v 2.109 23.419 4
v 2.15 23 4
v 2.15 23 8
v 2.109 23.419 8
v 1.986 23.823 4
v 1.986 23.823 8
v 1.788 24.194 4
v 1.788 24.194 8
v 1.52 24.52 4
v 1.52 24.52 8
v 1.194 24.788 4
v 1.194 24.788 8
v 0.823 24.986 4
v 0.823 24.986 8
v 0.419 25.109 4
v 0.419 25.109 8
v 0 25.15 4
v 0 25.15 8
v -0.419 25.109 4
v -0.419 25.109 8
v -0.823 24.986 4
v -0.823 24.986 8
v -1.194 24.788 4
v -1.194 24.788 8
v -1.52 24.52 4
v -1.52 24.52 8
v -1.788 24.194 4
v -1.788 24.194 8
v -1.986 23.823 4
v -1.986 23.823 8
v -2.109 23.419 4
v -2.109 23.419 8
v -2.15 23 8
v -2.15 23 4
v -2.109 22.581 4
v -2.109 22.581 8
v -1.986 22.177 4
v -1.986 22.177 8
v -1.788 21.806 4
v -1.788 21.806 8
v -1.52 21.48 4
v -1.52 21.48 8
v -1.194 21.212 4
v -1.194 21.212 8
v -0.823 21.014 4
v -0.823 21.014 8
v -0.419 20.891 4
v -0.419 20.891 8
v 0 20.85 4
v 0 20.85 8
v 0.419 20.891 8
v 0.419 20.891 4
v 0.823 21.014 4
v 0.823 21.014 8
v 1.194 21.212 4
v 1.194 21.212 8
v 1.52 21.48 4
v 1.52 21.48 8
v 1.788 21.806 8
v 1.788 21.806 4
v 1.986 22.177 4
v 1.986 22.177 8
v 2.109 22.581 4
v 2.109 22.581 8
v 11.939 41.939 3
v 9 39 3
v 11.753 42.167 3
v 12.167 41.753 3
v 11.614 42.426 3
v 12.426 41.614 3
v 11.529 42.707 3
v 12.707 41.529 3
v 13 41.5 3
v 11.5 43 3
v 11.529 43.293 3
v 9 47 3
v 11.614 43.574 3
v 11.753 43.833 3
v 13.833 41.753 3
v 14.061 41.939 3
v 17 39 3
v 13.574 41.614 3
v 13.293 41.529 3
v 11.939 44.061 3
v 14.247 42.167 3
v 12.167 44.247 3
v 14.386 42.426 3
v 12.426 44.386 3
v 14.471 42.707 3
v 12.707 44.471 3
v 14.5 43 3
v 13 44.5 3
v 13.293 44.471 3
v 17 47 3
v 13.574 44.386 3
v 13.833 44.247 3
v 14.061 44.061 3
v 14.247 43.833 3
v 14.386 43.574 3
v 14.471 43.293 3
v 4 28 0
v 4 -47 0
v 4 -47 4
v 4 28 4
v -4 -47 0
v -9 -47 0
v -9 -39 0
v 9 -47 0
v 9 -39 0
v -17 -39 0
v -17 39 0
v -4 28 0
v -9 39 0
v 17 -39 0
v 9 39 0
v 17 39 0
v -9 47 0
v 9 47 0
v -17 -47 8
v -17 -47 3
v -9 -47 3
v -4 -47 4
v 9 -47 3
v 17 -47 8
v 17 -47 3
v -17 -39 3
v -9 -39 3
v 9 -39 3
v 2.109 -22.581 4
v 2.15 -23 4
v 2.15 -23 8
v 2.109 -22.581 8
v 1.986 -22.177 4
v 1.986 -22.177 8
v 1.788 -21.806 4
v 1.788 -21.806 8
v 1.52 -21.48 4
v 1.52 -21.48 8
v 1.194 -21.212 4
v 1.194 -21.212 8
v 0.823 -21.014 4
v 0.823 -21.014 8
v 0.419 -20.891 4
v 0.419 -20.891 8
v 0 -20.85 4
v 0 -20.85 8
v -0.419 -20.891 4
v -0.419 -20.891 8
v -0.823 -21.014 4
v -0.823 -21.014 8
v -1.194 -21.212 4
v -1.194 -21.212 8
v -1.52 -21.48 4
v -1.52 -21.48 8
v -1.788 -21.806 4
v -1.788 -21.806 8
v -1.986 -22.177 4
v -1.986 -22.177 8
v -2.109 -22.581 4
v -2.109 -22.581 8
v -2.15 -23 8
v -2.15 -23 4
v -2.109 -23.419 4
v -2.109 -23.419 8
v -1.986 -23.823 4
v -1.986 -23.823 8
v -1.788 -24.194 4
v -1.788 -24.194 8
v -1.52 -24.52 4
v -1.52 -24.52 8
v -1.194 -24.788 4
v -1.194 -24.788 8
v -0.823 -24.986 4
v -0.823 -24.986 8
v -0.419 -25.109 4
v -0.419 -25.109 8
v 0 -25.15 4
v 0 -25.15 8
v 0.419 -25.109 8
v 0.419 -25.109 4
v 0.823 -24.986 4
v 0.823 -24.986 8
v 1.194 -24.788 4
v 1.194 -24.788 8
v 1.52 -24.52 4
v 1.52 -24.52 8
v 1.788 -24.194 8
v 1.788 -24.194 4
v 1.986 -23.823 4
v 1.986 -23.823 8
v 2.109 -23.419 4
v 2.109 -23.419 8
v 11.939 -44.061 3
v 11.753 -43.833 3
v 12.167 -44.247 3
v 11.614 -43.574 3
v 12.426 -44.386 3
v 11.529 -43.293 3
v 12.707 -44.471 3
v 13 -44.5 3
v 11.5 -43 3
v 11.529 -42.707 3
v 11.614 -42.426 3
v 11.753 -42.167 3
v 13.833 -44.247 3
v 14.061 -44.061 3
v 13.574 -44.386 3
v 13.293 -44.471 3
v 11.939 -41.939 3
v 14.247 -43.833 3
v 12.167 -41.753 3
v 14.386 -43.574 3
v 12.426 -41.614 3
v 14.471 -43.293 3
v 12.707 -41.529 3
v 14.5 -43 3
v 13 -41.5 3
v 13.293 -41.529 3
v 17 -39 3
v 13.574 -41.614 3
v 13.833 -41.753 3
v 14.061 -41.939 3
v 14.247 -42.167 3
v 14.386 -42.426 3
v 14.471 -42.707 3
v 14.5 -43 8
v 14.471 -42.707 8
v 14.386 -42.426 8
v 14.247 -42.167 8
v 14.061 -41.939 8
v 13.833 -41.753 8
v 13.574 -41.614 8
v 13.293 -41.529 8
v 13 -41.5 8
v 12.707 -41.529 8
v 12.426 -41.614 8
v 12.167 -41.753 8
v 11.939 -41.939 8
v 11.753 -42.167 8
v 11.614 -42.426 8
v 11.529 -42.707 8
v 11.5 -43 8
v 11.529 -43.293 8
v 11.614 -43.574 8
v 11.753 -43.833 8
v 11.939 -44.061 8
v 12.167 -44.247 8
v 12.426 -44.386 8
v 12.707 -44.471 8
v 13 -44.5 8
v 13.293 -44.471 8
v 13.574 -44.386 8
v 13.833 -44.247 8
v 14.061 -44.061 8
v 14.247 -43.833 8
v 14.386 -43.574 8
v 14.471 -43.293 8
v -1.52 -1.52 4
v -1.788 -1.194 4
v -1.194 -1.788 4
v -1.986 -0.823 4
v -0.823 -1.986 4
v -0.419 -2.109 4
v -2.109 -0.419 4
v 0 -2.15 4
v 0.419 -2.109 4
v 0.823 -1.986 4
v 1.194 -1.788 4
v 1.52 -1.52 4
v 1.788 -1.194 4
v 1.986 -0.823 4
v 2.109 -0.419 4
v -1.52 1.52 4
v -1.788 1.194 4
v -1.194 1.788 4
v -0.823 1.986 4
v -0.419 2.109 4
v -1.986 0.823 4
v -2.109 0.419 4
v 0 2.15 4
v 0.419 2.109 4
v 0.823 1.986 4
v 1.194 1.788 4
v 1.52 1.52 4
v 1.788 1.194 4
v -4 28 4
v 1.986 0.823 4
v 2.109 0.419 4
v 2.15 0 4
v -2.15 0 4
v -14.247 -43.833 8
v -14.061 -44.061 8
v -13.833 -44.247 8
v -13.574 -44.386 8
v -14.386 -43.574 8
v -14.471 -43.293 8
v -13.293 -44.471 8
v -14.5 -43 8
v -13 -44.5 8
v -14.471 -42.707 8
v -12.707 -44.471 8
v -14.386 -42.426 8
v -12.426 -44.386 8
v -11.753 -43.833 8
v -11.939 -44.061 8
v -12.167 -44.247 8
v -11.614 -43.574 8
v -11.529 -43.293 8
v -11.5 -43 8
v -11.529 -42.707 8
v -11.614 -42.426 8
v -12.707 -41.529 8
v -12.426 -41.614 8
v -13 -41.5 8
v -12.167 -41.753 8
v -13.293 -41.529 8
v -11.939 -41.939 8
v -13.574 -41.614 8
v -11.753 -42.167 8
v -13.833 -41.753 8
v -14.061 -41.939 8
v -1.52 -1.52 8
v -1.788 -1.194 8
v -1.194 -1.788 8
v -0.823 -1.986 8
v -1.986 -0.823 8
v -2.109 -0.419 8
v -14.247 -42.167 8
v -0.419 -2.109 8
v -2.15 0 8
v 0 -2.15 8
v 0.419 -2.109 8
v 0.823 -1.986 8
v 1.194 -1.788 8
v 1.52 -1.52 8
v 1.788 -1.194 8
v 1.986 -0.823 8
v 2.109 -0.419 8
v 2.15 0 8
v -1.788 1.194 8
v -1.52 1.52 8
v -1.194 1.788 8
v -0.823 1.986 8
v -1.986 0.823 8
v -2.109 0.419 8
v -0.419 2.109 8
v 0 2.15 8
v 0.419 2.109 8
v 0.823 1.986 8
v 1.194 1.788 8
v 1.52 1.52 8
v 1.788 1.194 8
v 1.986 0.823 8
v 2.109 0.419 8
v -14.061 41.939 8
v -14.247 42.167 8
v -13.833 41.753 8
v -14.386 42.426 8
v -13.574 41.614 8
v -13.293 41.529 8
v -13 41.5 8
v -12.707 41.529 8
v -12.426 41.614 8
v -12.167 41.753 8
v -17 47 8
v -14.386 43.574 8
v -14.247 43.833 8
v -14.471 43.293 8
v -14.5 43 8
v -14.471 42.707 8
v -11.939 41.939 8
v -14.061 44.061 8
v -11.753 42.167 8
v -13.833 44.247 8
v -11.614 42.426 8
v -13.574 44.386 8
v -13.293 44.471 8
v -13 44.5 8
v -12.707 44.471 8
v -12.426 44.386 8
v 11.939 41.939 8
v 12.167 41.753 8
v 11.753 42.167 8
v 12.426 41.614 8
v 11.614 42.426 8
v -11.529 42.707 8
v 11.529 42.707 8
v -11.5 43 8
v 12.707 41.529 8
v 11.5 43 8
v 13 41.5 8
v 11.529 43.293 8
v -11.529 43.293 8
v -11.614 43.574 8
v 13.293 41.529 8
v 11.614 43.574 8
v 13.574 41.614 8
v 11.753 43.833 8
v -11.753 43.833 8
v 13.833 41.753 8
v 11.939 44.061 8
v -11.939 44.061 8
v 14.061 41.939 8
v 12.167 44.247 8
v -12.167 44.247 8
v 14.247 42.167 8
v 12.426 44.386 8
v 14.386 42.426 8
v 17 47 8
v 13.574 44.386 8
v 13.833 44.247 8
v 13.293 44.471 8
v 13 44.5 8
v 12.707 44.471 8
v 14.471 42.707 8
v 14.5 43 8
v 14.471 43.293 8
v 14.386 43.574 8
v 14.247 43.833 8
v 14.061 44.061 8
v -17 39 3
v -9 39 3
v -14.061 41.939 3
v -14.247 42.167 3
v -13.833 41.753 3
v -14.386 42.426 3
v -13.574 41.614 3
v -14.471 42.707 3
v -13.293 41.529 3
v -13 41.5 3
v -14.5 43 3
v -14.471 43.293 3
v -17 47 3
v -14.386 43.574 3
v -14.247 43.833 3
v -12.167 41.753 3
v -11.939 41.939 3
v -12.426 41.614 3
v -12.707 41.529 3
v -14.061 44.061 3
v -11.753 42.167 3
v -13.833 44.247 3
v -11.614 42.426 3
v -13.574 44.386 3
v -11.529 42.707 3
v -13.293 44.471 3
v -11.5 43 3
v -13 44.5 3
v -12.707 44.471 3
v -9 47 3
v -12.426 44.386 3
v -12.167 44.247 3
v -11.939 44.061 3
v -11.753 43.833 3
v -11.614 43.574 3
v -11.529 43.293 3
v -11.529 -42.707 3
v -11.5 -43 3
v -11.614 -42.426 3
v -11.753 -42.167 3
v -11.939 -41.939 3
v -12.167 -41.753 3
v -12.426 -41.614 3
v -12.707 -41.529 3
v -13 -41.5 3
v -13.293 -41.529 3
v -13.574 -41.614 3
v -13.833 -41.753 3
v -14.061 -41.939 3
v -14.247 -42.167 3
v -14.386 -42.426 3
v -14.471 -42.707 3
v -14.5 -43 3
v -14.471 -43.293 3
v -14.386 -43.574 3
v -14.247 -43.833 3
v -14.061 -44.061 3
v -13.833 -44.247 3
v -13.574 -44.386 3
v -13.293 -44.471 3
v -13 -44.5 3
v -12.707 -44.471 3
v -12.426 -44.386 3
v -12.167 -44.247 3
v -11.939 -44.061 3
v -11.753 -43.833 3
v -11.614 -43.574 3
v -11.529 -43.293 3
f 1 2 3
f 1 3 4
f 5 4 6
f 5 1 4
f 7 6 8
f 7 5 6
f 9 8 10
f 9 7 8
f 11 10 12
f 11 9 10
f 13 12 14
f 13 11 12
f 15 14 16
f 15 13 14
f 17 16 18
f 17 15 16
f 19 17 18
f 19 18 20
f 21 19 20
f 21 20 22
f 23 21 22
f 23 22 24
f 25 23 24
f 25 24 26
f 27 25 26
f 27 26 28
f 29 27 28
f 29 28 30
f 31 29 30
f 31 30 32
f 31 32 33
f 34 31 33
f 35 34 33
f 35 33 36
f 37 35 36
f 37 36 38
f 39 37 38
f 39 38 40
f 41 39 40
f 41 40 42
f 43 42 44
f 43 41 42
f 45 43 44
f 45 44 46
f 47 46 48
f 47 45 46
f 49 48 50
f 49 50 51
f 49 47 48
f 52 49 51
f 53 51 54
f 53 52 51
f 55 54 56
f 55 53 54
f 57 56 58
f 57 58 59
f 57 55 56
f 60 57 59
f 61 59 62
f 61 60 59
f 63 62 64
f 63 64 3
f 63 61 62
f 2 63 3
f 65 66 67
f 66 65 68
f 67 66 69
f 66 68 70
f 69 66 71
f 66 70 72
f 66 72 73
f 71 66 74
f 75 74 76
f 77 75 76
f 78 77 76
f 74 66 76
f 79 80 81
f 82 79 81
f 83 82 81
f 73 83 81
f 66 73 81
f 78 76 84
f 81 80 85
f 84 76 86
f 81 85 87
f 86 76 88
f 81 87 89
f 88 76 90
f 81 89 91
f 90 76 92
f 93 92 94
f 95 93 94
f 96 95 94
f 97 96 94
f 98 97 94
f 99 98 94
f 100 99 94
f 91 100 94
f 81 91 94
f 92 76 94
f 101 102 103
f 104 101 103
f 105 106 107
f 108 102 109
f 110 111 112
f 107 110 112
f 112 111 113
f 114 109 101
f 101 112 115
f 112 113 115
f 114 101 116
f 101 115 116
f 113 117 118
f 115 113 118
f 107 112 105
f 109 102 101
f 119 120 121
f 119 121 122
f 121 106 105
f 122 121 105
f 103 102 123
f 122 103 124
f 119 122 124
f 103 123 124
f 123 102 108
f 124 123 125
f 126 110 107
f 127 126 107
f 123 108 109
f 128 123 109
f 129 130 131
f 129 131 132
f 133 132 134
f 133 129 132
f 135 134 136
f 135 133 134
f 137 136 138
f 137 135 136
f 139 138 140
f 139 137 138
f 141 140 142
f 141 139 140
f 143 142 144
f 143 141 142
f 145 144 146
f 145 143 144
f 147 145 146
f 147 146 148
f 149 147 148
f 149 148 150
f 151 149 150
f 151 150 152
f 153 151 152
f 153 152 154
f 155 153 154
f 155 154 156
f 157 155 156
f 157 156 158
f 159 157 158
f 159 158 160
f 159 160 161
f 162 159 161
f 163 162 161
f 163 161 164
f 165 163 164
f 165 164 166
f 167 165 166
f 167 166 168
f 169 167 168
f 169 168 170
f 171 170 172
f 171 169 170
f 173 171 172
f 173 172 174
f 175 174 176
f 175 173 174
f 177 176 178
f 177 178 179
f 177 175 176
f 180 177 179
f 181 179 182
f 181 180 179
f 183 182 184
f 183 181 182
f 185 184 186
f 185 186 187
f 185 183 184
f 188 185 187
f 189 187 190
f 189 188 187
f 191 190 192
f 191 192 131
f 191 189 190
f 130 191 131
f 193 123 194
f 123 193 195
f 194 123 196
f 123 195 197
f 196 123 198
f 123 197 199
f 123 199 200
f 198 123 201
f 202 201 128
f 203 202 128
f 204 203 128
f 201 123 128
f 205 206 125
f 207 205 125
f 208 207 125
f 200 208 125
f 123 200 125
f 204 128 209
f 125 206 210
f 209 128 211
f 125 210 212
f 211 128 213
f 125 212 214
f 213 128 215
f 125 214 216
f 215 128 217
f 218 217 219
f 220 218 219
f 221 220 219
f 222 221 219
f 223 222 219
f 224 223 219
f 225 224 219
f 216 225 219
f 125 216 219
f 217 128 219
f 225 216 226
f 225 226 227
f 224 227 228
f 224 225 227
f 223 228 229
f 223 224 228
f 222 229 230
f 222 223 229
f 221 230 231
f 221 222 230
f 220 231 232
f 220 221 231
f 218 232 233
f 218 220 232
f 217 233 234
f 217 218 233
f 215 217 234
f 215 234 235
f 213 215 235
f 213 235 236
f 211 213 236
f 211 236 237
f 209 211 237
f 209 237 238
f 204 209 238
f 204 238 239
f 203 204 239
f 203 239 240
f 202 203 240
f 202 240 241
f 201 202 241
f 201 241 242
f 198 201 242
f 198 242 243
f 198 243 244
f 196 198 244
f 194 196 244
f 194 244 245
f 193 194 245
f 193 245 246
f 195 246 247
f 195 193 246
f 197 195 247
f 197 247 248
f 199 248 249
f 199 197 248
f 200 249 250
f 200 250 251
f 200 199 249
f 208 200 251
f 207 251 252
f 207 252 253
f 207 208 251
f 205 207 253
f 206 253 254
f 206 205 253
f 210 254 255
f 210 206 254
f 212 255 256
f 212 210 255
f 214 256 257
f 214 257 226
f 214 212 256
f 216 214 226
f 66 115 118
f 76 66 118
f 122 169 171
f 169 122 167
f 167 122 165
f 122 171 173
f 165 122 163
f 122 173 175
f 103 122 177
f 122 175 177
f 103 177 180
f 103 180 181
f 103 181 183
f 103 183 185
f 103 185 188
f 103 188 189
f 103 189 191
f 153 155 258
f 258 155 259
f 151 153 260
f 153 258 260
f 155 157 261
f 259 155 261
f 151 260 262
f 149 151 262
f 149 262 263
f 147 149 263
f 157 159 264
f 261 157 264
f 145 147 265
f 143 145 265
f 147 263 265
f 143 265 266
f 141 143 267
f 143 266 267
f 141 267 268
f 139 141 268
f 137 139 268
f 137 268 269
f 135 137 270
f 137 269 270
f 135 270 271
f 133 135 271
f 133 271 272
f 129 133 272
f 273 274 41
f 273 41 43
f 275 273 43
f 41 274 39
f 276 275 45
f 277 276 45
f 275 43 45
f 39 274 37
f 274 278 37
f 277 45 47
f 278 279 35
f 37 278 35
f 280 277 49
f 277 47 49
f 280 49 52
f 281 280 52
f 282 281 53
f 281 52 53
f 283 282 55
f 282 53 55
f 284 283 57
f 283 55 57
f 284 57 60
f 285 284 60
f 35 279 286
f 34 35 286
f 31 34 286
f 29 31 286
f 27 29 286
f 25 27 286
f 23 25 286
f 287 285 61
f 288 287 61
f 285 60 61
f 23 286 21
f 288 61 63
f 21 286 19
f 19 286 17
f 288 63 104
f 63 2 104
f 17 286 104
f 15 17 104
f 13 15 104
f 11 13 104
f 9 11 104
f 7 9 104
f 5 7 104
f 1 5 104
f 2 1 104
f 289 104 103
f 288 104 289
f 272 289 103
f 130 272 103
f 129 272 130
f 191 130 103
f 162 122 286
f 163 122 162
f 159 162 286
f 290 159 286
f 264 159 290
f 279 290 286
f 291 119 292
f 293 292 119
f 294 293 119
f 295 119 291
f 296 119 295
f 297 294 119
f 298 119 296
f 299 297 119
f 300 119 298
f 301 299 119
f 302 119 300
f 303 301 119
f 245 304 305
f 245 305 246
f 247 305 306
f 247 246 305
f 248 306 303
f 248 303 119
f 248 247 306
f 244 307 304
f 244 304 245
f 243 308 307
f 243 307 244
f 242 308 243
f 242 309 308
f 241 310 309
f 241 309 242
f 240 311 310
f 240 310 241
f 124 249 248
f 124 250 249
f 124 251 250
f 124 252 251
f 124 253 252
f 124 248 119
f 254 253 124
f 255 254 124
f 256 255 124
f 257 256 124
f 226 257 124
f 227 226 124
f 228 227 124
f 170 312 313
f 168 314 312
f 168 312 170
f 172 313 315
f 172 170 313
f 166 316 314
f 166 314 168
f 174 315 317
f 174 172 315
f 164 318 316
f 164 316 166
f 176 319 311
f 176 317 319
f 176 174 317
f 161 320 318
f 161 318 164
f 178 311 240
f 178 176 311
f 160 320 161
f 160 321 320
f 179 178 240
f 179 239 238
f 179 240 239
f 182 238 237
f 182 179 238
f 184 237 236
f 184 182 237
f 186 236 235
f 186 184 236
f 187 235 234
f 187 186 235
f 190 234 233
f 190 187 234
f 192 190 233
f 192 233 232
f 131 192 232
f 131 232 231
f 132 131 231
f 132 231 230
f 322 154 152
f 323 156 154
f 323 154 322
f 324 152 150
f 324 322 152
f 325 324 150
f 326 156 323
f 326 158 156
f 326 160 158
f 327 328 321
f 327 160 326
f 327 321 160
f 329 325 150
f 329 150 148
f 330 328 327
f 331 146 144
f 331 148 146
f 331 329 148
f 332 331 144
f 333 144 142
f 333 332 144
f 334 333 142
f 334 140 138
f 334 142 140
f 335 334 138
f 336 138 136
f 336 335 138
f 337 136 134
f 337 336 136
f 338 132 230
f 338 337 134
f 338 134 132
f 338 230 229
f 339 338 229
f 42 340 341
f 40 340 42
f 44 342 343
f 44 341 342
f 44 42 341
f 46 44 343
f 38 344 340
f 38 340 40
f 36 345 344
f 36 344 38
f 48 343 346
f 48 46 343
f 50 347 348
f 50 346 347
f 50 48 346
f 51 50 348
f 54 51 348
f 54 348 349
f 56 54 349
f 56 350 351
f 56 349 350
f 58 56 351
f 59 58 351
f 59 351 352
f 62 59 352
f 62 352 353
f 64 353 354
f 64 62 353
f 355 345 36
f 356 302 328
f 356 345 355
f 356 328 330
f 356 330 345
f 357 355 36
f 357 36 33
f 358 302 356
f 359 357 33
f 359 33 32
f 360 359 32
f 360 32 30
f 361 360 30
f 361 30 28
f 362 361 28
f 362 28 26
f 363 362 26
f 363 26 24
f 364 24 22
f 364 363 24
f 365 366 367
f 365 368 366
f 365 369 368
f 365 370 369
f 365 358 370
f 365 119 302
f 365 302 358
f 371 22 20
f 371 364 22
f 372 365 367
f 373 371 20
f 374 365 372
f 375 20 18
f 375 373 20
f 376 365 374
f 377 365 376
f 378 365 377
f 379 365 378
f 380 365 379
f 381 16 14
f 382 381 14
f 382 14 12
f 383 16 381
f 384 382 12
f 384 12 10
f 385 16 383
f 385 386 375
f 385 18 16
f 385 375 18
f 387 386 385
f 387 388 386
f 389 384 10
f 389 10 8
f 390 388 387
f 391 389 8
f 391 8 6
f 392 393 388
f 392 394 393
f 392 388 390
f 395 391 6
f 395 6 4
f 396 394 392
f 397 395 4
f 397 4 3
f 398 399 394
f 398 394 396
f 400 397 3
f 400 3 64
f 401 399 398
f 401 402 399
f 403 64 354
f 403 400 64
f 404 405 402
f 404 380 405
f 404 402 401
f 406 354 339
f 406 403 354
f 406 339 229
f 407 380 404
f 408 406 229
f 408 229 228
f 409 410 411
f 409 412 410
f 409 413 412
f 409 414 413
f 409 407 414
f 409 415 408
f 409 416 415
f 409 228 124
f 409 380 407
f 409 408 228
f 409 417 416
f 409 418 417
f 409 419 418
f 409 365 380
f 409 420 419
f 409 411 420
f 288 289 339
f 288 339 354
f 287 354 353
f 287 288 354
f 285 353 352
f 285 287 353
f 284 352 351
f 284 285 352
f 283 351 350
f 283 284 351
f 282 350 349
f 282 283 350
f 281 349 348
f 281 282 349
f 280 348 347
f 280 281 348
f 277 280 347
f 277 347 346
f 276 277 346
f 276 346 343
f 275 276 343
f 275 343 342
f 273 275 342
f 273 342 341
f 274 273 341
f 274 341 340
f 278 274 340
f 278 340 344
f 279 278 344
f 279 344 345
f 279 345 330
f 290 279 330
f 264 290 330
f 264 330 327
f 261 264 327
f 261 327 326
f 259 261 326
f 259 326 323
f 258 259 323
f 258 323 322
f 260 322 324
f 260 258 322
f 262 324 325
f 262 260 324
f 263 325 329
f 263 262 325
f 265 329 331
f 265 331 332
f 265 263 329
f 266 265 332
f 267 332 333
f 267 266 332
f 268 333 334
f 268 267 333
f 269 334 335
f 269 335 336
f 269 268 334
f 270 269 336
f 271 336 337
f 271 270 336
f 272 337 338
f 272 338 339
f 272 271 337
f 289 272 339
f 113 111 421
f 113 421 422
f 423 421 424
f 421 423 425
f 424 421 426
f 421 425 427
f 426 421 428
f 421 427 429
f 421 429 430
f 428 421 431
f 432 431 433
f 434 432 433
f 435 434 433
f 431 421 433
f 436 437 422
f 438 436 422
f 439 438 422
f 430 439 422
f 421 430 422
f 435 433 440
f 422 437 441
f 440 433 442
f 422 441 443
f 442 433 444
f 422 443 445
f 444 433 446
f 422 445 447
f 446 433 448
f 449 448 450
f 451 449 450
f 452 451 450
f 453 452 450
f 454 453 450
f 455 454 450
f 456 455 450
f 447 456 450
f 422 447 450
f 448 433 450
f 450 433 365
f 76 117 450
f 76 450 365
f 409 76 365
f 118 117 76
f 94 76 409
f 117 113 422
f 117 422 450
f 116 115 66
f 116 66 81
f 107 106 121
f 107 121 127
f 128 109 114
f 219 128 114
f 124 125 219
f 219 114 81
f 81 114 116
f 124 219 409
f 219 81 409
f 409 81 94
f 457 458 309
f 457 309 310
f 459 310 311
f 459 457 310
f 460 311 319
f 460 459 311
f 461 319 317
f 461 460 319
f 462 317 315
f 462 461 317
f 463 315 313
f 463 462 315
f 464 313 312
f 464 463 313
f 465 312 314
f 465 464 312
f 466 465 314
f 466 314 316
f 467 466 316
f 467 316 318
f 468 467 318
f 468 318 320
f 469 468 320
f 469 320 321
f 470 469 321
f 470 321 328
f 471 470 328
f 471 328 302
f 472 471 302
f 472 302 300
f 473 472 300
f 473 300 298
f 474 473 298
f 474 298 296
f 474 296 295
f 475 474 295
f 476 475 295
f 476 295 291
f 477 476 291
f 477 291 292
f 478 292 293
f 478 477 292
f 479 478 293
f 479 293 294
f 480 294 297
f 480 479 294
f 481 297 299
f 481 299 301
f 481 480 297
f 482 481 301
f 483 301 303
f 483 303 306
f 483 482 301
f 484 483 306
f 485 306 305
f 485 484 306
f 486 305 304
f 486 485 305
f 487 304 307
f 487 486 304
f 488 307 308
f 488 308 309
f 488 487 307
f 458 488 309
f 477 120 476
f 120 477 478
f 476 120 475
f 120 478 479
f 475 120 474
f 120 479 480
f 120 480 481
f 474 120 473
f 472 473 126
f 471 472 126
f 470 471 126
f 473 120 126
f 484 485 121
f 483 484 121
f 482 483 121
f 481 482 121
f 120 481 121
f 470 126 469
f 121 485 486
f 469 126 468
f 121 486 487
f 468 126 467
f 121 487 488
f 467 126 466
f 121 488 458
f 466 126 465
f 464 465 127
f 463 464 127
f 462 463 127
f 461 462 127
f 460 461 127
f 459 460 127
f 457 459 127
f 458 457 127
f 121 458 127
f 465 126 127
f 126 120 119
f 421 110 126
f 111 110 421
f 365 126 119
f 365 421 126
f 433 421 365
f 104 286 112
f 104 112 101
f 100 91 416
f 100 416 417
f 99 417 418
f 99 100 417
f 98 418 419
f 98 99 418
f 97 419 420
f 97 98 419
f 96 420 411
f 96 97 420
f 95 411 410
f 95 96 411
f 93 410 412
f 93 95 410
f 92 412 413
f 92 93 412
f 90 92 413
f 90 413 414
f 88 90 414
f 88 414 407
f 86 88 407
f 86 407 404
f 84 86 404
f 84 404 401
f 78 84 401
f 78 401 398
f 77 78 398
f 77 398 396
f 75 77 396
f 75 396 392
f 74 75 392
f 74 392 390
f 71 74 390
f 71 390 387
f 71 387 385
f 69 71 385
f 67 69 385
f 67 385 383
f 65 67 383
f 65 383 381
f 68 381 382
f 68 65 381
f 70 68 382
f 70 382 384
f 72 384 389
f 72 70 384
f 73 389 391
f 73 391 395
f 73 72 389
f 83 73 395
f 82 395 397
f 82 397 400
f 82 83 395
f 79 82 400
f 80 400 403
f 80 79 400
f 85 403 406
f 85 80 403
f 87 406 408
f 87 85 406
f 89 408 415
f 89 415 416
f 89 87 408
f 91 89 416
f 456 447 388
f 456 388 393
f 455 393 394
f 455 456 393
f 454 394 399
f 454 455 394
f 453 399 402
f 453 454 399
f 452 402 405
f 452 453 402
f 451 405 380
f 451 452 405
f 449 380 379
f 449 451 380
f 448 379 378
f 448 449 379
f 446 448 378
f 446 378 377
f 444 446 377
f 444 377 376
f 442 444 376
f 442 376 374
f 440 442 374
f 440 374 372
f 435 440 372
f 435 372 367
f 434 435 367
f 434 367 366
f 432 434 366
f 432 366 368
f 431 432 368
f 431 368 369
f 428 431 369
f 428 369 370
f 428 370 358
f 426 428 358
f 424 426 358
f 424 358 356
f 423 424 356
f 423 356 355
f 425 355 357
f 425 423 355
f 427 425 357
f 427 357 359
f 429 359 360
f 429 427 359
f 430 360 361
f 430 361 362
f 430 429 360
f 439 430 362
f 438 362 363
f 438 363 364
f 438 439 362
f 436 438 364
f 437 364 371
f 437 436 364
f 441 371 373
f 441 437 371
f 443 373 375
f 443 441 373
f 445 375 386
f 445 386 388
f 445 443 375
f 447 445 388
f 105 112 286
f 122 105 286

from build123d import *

# Parameters (mm, degrees)
F0_W          = 34
F0_H          = 94
F0_R          = 1.5
F0_R_2        = 2.15
F1_DEPTH      = 8
F2_W          = 8
F2_H          = 8
F3_DEPTH      = 3
F4_W          = 8
F4_H          = 5.470946
F5_DEPTH      = 100
F5_DEPTH_BACK = 28


with BuildPart() as f1:
    # F0 (on Top) → F1 (new body)
    with BuildSketch(Plane.XY):
        Rectangle(F0_W, F0_H)
        with Locations((-13, -43)):
            Circle(F0_R, mode=Mode.SUBTRACT)
        with Locations((13, -43)):
            Circle(F0_R, mode=Mode.SUBTRACT)
        with Locations((0, -23)):
            Circle(F0_R_2, mode=Mode.SUBTRACT)
        with Locations((-13, 43)):
            Circle(F0_R, mode=Mode.SUBTRACT)
        Circle(F0_R_2, mode=Mode.SUBTRACT)
        with Locations((0, 23)):
            Circle(F0_R_2, mode=Mode.SUBTRACT)
        with Locations((13, 43)):
            Circle(F0_R, mode=Mode.SUBTRACT)
    extrude(amount=F1_DEPTH)

    # F2 (on Top) → F3 (cut)
    with BuildSketch(Plane.XY):
        with Locations((-13, 43)):
            Rectangle(F2_W, F2_H)
        with Locations((13, 43)):
            Rectangle(F2_W, F2_H)
        with Locations((-13, -43)):
            Rectangle(F2_W, F2_H)
        with Locations((13, -43)):
            Rectangle(F2_W, F2_H)
    extrude(amount=F3_DEPTH, mode=Mode.SUBTRACT)

    # F4 (on Front) → F5 (cut, two sides)
    with BuildSketch(Plane.XZ) as f5_sk:
        with Locations((0, 1.264527)):
            Rectangle(F4_W, F4_H)
    extrude(amount=F5_DEPTH, mode=Mode.SUBTRACT)
    extrude(f5_sk.sketch, amount=-F5_DEPTH_BACK, mode=Mode.SUBTRACT)


solid = f1.part
